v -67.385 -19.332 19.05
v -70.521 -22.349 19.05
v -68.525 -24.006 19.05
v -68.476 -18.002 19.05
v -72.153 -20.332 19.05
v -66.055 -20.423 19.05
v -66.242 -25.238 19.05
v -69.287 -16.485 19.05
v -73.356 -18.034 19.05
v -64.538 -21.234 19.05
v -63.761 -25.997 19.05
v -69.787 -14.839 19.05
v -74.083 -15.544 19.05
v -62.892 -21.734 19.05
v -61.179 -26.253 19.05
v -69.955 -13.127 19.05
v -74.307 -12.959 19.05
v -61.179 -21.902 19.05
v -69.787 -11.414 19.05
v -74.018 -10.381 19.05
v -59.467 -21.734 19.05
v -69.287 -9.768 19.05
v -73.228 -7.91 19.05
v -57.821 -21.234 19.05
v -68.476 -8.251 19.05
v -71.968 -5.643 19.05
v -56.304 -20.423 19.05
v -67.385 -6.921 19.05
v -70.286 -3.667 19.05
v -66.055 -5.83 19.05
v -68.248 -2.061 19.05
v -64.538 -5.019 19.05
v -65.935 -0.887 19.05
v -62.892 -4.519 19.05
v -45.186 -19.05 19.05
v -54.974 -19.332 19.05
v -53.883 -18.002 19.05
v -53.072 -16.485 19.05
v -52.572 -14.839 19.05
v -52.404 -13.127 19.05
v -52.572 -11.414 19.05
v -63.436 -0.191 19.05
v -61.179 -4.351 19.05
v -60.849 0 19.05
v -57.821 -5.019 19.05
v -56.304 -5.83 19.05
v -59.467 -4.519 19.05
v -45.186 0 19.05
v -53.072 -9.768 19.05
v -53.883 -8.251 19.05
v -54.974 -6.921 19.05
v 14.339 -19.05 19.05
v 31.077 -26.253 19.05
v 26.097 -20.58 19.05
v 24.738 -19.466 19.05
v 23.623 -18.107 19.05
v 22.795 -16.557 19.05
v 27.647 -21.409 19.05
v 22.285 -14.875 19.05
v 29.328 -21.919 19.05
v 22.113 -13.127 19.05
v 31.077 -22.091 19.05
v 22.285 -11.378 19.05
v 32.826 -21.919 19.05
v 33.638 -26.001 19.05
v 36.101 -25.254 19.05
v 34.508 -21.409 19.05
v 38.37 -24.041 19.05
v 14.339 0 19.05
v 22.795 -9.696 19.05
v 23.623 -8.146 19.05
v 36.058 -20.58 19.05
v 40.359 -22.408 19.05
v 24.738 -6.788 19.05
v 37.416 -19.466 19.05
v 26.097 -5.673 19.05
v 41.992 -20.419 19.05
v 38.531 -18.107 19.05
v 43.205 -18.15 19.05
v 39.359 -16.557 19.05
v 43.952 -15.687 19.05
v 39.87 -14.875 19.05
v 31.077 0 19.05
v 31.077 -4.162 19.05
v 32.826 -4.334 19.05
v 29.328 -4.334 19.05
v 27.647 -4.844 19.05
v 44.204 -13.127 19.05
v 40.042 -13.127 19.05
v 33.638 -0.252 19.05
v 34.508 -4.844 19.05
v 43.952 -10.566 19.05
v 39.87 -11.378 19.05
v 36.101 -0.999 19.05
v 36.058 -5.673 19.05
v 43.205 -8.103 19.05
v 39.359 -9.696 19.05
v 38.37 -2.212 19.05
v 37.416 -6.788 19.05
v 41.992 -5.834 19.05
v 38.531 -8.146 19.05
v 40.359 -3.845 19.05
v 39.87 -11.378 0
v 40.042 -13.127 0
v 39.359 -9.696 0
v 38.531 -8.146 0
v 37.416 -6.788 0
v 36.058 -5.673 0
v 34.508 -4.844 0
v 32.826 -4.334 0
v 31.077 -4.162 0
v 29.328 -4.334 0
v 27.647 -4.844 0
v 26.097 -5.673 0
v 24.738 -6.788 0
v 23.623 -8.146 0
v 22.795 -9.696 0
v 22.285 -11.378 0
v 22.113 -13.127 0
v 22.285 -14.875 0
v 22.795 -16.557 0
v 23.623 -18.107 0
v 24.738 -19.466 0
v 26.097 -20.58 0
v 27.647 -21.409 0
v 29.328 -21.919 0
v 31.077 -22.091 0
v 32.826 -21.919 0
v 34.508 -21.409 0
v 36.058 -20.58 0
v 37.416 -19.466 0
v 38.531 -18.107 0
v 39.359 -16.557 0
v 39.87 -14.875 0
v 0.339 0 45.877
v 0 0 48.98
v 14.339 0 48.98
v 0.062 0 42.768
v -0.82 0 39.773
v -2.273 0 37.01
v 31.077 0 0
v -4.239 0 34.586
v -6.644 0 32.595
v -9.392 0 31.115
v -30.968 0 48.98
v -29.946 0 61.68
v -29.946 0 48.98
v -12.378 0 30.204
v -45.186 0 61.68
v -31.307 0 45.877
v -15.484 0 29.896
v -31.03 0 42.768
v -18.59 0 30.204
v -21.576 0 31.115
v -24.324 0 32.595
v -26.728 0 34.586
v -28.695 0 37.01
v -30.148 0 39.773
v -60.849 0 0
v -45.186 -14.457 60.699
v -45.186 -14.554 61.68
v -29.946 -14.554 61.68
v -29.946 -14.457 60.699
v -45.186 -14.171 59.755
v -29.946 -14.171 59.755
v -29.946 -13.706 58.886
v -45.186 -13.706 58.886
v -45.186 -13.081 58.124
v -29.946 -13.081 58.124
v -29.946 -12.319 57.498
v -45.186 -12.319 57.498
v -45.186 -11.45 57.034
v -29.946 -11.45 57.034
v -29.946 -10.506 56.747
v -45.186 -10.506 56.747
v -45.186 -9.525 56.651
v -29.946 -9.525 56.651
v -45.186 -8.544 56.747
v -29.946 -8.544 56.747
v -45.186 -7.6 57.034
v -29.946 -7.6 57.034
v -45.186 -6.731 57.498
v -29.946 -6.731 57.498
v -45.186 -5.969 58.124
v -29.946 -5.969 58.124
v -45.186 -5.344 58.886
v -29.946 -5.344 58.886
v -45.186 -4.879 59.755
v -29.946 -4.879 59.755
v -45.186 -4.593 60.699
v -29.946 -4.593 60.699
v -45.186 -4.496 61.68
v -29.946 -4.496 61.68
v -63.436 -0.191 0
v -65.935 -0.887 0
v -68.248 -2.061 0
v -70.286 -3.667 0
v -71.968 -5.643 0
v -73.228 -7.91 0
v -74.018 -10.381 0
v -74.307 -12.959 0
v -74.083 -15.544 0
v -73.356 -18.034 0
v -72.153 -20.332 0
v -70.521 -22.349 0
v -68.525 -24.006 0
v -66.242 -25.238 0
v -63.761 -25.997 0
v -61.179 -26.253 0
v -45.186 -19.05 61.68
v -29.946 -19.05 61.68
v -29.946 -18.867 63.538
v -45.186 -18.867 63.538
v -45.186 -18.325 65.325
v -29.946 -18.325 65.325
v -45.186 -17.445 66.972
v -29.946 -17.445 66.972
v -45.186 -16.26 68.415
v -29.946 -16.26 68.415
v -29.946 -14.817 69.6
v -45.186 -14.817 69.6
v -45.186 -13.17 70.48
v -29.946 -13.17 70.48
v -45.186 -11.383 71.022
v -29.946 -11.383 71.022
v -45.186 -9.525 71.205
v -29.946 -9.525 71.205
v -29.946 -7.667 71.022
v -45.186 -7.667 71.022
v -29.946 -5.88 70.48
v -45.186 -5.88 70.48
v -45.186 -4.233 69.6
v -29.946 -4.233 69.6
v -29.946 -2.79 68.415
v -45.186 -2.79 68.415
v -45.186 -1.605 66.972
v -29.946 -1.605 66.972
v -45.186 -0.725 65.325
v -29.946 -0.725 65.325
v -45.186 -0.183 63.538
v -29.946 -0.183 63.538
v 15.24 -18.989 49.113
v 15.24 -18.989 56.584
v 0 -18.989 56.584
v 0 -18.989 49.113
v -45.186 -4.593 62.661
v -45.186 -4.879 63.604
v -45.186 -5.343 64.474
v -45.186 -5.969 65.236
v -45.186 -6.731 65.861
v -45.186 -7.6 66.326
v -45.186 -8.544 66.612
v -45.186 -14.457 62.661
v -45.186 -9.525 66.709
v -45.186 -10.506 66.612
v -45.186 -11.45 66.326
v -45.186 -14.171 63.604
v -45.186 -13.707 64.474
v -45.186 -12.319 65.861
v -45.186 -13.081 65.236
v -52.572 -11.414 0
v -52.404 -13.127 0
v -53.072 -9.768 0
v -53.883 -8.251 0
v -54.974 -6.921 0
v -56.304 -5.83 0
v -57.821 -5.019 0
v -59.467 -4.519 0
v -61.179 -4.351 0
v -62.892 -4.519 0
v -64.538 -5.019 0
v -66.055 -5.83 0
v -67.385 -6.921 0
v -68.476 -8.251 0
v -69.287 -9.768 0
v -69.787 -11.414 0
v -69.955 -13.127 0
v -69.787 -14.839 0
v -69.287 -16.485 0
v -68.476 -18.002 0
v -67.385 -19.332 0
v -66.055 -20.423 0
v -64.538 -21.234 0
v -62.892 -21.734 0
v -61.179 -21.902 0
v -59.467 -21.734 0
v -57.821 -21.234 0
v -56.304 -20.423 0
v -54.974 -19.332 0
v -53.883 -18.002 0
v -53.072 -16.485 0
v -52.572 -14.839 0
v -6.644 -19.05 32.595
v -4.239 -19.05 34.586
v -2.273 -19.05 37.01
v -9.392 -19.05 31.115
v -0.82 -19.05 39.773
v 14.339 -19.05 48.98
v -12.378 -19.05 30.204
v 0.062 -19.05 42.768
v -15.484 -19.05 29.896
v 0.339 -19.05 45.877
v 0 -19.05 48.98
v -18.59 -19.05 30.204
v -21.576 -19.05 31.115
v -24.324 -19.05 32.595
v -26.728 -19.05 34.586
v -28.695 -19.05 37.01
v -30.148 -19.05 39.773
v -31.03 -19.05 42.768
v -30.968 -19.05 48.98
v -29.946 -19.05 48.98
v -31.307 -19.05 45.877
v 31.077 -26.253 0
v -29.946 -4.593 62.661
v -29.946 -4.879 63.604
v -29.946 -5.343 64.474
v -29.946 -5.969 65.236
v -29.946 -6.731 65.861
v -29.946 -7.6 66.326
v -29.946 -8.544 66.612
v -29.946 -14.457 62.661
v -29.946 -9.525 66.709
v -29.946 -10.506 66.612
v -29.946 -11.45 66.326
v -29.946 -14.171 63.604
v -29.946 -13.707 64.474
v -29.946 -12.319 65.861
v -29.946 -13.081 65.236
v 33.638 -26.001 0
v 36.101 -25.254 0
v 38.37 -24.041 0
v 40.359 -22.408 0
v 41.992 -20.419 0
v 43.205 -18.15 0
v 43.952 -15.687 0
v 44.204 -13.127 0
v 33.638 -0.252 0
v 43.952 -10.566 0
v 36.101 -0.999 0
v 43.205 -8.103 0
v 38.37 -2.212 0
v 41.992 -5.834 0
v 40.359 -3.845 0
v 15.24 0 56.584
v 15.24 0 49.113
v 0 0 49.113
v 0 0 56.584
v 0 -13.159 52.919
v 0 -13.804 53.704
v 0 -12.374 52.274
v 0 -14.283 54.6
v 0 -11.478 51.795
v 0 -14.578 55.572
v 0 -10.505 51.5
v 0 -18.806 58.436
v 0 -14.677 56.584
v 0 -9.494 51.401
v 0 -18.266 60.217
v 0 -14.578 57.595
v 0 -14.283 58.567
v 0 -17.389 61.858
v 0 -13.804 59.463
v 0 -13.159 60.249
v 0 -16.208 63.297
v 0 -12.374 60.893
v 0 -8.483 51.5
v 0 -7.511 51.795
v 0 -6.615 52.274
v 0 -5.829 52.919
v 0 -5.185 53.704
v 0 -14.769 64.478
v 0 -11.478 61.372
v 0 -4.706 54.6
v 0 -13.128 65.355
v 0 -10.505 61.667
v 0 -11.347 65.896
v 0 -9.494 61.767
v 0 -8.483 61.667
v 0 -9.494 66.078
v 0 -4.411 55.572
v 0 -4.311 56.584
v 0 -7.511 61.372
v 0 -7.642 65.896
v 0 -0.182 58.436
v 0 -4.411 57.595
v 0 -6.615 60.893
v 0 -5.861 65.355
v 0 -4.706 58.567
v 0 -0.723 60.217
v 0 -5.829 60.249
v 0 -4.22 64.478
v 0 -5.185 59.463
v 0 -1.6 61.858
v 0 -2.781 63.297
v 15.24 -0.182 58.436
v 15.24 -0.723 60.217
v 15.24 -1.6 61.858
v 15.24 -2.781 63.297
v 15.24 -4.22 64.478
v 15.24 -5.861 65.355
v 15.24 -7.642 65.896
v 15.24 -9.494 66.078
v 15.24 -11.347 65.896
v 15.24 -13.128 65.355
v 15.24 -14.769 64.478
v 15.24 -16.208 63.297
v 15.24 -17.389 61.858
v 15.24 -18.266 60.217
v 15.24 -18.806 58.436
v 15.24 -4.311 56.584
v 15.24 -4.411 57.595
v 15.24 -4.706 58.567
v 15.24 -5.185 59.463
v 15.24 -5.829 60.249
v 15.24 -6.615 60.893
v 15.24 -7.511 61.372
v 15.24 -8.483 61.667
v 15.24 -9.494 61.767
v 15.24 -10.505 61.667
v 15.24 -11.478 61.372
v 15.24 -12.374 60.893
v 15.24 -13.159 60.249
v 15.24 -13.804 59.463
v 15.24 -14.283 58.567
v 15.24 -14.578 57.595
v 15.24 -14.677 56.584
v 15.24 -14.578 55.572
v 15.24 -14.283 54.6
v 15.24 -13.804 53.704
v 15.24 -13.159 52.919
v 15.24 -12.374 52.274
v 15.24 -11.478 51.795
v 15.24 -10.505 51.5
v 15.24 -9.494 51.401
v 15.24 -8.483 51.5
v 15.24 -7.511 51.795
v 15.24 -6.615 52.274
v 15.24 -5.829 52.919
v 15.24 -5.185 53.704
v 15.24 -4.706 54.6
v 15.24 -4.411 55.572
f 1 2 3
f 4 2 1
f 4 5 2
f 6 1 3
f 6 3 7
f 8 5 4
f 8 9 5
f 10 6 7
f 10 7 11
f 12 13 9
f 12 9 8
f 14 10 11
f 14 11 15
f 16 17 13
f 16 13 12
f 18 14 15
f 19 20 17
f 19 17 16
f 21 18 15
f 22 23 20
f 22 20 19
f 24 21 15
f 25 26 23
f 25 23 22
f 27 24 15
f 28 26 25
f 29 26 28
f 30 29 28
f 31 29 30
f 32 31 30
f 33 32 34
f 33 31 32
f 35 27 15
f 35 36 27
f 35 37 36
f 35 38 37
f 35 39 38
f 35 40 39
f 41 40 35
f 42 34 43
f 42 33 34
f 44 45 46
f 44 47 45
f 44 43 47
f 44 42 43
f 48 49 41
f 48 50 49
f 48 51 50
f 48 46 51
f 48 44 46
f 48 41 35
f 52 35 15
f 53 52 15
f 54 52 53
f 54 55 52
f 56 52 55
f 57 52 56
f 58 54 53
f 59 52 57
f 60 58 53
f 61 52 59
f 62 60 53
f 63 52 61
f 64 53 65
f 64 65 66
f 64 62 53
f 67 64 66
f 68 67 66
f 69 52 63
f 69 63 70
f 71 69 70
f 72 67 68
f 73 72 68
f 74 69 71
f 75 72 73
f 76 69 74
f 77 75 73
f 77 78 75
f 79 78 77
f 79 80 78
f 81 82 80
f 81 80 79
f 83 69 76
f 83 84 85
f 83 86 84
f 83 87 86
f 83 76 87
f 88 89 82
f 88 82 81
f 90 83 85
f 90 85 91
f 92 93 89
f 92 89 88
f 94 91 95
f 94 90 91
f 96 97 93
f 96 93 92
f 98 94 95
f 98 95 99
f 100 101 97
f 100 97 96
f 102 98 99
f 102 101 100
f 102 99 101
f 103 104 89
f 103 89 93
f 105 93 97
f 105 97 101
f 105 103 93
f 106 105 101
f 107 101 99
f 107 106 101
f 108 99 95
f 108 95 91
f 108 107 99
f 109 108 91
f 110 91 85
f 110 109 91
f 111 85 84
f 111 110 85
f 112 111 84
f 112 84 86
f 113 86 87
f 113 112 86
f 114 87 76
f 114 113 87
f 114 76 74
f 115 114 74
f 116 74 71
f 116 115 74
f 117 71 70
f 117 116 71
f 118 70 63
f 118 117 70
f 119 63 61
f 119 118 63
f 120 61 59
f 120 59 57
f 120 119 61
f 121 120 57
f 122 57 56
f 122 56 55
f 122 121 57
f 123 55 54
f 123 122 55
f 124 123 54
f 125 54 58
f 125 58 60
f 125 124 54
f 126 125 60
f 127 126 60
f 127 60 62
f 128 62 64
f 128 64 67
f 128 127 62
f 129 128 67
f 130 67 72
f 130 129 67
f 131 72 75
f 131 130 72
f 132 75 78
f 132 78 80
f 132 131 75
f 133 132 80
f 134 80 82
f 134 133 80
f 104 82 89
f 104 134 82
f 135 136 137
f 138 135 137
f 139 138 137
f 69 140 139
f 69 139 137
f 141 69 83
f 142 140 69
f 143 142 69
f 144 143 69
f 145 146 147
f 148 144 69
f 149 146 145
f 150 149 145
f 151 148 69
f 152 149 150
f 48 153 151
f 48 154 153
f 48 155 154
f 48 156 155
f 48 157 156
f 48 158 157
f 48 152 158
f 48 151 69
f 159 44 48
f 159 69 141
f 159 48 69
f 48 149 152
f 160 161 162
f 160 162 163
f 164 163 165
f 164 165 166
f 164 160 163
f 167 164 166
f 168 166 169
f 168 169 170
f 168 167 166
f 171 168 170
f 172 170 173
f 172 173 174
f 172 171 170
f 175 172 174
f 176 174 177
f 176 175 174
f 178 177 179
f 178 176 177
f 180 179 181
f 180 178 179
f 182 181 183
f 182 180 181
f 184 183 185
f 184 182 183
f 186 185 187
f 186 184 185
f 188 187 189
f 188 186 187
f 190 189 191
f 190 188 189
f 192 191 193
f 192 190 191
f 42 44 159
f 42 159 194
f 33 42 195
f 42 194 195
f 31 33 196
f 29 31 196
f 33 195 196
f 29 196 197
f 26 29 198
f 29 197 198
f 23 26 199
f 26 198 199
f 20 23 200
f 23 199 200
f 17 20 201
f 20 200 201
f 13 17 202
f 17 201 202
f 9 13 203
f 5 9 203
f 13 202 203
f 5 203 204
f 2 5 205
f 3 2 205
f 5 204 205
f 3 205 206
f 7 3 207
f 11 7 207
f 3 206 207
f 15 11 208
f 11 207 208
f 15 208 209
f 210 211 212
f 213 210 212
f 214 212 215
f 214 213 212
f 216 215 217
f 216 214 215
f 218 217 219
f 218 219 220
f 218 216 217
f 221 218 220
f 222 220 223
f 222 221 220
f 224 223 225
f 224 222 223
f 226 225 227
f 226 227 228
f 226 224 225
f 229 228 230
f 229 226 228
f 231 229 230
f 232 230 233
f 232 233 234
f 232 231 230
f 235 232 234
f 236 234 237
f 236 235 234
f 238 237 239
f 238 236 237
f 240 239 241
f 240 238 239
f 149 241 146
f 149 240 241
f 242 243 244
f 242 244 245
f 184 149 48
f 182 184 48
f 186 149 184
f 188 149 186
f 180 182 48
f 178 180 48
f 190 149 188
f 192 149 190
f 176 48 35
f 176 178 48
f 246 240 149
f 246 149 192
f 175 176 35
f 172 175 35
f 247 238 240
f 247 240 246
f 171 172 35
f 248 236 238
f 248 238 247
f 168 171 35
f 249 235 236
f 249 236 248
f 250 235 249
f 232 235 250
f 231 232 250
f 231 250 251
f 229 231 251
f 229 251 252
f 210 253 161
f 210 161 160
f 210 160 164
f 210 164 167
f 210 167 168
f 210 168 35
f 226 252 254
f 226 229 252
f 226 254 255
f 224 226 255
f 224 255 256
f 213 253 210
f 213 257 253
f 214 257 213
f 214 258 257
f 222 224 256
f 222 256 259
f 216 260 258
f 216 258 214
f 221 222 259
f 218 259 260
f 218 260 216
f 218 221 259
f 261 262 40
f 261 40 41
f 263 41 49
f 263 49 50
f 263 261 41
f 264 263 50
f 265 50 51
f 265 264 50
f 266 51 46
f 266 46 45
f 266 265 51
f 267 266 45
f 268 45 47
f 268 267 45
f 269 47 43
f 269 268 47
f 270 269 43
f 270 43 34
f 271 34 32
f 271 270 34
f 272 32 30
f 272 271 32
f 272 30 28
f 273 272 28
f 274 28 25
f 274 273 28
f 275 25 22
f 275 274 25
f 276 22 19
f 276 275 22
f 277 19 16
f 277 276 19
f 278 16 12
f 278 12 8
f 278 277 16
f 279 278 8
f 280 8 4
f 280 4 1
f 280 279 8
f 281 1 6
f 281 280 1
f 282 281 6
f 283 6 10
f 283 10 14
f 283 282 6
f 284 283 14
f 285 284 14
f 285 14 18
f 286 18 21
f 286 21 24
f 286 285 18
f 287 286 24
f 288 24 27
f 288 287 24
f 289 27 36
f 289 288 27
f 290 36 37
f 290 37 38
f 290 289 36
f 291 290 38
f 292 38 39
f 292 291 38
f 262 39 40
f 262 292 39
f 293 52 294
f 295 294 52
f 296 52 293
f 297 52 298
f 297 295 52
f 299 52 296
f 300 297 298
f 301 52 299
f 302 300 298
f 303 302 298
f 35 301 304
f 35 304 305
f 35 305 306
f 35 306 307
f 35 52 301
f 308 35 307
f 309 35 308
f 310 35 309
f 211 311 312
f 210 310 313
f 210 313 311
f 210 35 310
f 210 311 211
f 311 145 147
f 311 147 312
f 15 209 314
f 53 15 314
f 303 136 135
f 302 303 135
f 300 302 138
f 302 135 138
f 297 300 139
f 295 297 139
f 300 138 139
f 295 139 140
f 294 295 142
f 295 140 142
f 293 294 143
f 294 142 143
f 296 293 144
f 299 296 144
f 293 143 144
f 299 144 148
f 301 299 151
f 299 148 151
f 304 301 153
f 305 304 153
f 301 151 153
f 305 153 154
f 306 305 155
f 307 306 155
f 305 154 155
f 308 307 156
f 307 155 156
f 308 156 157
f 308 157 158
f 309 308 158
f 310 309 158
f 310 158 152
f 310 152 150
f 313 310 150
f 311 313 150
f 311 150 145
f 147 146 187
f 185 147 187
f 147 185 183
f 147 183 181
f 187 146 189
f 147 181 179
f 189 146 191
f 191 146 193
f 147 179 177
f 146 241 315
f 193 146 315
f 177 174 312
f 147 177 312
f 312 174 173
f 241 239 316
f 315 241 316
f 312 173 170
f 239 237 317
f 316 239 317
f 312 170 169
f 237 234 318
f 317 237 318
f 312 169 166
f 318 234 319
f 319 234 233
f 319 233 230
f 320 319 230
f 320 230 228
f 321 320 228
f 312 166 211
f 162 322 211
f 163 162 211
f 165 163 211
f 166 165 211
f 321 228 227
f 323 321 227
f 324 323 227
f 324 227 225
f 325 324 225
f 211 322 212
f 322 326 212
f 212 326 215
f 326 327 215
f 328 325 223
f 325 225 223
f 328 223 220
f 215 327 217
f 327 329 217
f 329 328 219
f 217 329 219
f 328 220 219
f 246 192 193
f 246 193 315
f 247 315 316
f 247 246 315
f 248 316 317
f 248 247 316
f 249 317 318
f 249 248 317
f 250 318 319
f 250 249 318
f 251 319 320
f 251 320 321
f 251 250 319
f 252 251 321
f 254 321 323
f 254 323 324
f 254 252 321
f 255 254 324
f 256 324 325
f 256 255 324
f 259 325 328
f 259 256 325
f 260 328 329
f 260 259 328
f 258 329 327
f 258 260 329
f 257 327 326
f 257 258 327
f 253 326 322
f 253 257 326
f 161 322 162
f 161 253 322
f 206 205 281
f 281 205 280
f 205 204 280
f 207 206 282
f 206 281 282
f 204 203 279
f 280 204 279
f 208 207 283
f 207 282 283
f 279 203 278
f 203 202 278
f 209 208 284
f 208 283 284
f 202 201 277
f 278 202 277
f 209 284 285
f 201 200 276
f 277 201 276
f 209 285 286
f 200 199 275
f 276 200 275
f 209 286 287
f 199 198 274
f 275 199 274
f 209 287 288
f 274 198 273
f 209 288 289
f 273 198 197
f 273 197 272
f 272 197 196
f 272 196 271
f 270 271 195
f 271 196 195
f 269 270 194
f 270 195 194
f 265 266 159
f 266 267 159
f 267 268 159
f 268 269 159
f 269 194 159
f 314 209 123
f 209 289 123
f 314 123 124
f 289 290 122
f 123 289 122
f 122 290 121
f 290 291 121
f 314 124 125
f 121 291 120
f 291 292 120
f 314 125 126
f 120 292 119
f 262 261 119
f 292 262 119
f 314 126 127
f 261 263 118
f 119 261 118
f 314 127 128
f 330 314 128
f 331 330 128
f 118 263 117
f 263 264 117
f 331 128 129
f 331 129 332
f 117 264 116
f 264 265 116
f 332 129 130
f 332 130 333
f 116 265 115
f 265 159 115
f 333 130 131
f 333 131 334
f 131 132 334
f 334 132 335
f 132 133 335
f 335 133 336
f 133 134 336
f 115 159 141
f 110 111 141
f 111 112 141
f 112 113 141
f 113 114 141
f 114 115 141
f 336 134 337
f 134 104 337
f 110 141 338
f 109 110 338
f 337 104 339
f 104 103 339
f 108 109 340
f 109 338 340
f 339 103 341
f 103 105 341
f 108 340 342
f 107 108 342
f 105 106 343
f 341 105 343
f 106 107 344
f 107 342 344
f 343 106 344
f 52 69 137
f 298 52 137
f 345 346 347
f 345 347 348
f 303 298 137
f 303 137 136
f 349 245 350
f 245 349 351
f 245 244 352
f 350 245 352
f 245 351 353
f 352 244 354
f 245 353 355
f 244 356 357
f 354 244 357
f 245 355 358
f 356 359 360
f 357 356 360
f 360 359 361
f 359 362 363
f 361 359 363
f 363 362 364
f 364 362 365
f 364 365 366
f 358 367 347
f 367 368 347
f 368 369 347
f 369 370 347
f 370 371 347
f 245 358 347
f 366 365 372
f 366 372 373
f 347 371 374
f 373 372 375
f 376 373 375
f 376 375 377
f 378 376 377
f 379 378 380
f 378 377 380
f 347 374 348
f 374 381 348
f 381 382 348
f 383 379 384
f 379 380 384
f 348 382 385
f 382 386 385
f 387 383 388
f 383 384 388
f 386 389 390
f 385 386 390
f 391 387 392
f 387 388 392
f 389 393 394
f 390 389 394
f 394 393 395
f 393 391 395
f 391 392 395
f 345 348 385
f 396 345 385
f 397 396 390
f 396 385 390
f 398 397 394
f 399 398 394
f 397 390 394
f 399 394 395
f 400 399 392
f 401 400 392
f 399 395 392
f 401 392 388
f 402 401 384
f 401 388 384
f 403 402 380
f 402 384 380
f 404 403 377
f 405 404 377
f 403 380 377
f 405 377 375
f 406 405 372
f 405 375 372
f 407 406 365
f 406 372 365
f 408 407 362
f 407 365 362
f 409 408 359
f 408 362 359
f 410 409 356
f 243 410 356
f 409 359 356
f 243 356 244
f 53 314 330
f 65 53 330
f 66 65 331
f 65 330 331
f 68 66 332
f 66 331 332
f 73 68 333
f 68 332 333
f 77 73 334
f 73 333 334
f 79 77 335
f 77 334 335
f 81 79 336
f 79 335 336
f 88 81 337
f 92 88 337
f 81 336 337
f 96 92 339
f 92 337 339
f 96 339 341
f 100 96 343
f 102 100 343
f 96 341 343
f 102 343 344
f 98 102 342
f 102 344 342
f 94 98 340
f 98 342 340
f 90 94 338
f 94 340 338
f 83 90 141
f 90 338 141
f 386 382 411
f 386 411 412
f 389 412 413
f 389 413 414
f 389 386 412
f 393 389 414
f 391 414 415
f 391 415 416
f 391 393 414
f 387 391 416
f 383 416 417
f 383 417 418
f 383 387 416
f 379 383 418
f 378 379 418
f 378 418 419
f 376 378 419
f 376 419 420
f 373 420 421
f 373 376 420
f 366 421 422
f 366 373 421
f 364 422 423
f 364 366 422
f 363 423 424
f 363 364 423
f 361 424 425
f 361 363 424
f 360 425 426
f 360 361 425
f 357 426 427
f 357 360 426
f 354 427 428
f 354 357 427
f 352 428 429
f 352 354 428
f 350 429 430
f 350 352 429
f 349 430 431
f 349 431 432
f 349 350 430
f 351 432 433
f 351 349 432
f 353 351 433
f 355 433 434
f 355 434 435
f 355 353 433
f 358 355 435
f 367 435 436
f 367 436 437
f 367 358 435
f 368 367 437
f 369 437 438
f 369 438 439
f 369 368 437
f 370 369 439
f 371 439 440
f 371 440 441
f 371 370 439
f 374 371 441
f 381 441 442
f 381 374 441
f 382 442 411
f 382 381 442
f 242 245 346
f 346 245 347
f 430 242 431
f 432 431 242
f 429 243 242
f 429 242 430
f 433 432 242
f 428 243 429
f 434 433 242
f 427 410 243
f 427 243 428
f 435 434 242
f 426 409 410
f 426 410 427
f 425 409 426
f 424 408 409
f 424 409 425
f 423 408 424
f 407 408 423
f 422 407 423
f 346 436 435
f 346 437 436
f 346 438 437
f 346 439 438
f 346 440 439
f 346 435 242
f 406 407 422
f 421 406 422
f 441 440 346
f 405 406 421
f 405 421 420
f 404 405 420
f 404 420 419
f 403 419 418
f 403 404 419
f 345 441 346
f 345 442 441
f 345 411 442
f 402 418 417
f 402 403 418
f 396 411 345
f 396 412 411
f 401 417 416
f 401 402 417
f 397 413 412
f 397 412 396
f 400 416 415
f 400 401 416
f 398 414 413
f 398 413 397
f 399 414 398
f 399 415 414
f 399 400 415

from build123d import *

# Parameters (mm, degrees)
F0_R     = 8.775751
F0_R_2   = 8.96467
F1_DEPTH = 19.05
F3_DEPTH = 19.05
F4_R     = 5.183102
F5_DEPTH = 15.24
F7_DEPTH = 15.24


with BuildPart() as f1:
    # F0 (on Top) → F1 (new body)
    with BuildSketch(Plane.XY):
        with BuildLine():
            Line((31.077219, 0), (-60.848664, 0))
            ThreePointArc((-60.848664, 0), (-74.30708, -12.959056), (-61.179478, -26.253121))
            Line((-61.179478, -26.253121), (31.077219, -26.253121))
            ThreePointArc((31.077219, -26.253121), (44.20378, -13.12656), (31.077219, 0))
        make_face()
        with Locations((-61.179478, -13.12656)):
            Circle(F0_R, mode=Mode.SUBTRACT)
        with Locations((31.077219, -13.12656)):
            Circle(F0_R_2, mode=Mode.SUBTRACT)
    extrude(amount=F1_DEPTH)

    # F2 (on Front) → F3 (join)
    with BuildSketch(Plane.XZ):
        with BuildLine():
            Line((-45.186371, 48.979893), (-45.186371, 19.020541))
            Line((-45.186371, 19.020541), (14.33914, 19.020541))
            Line((14.33914, 19.020541), (14.33914, 48.979893))
            Line((14.33914, 48.979893), (0, 48.979893))
            ThreePointArc((0, 48.979893), (-15.483864, 29.895664), (-30.967727, 48.979893))
            Line((-30.967727, 48.979893), (-45.186371, 48.979893))
        make_face()
    extrude(amount=F3_DEPTH)

    # F6 (on face) → F7 (join)
    with BuildSketch(Plane(origin=(-45.186371, 0, 0), x_dir=(0, -1, 0), z_dir=(-1, 0, 0))):
        with BuildLine():
            Line((14.554047, 61.679893), (19.05, 61.679893))
            ThreePointArc((19.05, 61.679893), (9.525, 71.204893), (0, 61.679893))
            Line((0, 61.679893), (4.495953, 61.679893))
            ThreePointArc((4.495953, 61.679893), (9.525, 66.708941), (14.554047, 61.679893))
        make_face()
        with BuildLine():
            Line((19.05, 48.979893), (19.05, 61.679893))
            Line((19.05, 61.679893), (14.554047, 61.679893))
            ThreePointArc((14.554047, 61.679893), (9.525, 56.650846), (4.495953, 61.679893))
            Line((4.495953, 61.679893), (0, 61.679893))
            Line((0, 61.679893), (0, 48.979893))
            Line((0, 48.979893), (19.05, 48.979893))
        make_face()
    extrude(amount=-F7_DEPTH)


with BuildPart() as f5:
    # F4 (on Right) → F5 (new body)
    with BuildSketch(Plane.YZ):
        with BuildLine():
            Line((-18.988613, 49.11286), (0, 49.11286))
            Line((0, 49.11286), (0, 56.583673))
            ThreePointArc((0, 56.583673), (-9.494307, 66.077979), (-18.988613, 56.583673))
            Line((-18.988613, 56.583673), (-18.988613, 49.11286))
        make_face()
        with Locations((-9.494307, 56.583673)):
            Circle(F4_R, mode=Mode.SUBTRACT)
    extrude(amount=F5_DEPTH)


solid = Compound([f1.part, f5.part])
